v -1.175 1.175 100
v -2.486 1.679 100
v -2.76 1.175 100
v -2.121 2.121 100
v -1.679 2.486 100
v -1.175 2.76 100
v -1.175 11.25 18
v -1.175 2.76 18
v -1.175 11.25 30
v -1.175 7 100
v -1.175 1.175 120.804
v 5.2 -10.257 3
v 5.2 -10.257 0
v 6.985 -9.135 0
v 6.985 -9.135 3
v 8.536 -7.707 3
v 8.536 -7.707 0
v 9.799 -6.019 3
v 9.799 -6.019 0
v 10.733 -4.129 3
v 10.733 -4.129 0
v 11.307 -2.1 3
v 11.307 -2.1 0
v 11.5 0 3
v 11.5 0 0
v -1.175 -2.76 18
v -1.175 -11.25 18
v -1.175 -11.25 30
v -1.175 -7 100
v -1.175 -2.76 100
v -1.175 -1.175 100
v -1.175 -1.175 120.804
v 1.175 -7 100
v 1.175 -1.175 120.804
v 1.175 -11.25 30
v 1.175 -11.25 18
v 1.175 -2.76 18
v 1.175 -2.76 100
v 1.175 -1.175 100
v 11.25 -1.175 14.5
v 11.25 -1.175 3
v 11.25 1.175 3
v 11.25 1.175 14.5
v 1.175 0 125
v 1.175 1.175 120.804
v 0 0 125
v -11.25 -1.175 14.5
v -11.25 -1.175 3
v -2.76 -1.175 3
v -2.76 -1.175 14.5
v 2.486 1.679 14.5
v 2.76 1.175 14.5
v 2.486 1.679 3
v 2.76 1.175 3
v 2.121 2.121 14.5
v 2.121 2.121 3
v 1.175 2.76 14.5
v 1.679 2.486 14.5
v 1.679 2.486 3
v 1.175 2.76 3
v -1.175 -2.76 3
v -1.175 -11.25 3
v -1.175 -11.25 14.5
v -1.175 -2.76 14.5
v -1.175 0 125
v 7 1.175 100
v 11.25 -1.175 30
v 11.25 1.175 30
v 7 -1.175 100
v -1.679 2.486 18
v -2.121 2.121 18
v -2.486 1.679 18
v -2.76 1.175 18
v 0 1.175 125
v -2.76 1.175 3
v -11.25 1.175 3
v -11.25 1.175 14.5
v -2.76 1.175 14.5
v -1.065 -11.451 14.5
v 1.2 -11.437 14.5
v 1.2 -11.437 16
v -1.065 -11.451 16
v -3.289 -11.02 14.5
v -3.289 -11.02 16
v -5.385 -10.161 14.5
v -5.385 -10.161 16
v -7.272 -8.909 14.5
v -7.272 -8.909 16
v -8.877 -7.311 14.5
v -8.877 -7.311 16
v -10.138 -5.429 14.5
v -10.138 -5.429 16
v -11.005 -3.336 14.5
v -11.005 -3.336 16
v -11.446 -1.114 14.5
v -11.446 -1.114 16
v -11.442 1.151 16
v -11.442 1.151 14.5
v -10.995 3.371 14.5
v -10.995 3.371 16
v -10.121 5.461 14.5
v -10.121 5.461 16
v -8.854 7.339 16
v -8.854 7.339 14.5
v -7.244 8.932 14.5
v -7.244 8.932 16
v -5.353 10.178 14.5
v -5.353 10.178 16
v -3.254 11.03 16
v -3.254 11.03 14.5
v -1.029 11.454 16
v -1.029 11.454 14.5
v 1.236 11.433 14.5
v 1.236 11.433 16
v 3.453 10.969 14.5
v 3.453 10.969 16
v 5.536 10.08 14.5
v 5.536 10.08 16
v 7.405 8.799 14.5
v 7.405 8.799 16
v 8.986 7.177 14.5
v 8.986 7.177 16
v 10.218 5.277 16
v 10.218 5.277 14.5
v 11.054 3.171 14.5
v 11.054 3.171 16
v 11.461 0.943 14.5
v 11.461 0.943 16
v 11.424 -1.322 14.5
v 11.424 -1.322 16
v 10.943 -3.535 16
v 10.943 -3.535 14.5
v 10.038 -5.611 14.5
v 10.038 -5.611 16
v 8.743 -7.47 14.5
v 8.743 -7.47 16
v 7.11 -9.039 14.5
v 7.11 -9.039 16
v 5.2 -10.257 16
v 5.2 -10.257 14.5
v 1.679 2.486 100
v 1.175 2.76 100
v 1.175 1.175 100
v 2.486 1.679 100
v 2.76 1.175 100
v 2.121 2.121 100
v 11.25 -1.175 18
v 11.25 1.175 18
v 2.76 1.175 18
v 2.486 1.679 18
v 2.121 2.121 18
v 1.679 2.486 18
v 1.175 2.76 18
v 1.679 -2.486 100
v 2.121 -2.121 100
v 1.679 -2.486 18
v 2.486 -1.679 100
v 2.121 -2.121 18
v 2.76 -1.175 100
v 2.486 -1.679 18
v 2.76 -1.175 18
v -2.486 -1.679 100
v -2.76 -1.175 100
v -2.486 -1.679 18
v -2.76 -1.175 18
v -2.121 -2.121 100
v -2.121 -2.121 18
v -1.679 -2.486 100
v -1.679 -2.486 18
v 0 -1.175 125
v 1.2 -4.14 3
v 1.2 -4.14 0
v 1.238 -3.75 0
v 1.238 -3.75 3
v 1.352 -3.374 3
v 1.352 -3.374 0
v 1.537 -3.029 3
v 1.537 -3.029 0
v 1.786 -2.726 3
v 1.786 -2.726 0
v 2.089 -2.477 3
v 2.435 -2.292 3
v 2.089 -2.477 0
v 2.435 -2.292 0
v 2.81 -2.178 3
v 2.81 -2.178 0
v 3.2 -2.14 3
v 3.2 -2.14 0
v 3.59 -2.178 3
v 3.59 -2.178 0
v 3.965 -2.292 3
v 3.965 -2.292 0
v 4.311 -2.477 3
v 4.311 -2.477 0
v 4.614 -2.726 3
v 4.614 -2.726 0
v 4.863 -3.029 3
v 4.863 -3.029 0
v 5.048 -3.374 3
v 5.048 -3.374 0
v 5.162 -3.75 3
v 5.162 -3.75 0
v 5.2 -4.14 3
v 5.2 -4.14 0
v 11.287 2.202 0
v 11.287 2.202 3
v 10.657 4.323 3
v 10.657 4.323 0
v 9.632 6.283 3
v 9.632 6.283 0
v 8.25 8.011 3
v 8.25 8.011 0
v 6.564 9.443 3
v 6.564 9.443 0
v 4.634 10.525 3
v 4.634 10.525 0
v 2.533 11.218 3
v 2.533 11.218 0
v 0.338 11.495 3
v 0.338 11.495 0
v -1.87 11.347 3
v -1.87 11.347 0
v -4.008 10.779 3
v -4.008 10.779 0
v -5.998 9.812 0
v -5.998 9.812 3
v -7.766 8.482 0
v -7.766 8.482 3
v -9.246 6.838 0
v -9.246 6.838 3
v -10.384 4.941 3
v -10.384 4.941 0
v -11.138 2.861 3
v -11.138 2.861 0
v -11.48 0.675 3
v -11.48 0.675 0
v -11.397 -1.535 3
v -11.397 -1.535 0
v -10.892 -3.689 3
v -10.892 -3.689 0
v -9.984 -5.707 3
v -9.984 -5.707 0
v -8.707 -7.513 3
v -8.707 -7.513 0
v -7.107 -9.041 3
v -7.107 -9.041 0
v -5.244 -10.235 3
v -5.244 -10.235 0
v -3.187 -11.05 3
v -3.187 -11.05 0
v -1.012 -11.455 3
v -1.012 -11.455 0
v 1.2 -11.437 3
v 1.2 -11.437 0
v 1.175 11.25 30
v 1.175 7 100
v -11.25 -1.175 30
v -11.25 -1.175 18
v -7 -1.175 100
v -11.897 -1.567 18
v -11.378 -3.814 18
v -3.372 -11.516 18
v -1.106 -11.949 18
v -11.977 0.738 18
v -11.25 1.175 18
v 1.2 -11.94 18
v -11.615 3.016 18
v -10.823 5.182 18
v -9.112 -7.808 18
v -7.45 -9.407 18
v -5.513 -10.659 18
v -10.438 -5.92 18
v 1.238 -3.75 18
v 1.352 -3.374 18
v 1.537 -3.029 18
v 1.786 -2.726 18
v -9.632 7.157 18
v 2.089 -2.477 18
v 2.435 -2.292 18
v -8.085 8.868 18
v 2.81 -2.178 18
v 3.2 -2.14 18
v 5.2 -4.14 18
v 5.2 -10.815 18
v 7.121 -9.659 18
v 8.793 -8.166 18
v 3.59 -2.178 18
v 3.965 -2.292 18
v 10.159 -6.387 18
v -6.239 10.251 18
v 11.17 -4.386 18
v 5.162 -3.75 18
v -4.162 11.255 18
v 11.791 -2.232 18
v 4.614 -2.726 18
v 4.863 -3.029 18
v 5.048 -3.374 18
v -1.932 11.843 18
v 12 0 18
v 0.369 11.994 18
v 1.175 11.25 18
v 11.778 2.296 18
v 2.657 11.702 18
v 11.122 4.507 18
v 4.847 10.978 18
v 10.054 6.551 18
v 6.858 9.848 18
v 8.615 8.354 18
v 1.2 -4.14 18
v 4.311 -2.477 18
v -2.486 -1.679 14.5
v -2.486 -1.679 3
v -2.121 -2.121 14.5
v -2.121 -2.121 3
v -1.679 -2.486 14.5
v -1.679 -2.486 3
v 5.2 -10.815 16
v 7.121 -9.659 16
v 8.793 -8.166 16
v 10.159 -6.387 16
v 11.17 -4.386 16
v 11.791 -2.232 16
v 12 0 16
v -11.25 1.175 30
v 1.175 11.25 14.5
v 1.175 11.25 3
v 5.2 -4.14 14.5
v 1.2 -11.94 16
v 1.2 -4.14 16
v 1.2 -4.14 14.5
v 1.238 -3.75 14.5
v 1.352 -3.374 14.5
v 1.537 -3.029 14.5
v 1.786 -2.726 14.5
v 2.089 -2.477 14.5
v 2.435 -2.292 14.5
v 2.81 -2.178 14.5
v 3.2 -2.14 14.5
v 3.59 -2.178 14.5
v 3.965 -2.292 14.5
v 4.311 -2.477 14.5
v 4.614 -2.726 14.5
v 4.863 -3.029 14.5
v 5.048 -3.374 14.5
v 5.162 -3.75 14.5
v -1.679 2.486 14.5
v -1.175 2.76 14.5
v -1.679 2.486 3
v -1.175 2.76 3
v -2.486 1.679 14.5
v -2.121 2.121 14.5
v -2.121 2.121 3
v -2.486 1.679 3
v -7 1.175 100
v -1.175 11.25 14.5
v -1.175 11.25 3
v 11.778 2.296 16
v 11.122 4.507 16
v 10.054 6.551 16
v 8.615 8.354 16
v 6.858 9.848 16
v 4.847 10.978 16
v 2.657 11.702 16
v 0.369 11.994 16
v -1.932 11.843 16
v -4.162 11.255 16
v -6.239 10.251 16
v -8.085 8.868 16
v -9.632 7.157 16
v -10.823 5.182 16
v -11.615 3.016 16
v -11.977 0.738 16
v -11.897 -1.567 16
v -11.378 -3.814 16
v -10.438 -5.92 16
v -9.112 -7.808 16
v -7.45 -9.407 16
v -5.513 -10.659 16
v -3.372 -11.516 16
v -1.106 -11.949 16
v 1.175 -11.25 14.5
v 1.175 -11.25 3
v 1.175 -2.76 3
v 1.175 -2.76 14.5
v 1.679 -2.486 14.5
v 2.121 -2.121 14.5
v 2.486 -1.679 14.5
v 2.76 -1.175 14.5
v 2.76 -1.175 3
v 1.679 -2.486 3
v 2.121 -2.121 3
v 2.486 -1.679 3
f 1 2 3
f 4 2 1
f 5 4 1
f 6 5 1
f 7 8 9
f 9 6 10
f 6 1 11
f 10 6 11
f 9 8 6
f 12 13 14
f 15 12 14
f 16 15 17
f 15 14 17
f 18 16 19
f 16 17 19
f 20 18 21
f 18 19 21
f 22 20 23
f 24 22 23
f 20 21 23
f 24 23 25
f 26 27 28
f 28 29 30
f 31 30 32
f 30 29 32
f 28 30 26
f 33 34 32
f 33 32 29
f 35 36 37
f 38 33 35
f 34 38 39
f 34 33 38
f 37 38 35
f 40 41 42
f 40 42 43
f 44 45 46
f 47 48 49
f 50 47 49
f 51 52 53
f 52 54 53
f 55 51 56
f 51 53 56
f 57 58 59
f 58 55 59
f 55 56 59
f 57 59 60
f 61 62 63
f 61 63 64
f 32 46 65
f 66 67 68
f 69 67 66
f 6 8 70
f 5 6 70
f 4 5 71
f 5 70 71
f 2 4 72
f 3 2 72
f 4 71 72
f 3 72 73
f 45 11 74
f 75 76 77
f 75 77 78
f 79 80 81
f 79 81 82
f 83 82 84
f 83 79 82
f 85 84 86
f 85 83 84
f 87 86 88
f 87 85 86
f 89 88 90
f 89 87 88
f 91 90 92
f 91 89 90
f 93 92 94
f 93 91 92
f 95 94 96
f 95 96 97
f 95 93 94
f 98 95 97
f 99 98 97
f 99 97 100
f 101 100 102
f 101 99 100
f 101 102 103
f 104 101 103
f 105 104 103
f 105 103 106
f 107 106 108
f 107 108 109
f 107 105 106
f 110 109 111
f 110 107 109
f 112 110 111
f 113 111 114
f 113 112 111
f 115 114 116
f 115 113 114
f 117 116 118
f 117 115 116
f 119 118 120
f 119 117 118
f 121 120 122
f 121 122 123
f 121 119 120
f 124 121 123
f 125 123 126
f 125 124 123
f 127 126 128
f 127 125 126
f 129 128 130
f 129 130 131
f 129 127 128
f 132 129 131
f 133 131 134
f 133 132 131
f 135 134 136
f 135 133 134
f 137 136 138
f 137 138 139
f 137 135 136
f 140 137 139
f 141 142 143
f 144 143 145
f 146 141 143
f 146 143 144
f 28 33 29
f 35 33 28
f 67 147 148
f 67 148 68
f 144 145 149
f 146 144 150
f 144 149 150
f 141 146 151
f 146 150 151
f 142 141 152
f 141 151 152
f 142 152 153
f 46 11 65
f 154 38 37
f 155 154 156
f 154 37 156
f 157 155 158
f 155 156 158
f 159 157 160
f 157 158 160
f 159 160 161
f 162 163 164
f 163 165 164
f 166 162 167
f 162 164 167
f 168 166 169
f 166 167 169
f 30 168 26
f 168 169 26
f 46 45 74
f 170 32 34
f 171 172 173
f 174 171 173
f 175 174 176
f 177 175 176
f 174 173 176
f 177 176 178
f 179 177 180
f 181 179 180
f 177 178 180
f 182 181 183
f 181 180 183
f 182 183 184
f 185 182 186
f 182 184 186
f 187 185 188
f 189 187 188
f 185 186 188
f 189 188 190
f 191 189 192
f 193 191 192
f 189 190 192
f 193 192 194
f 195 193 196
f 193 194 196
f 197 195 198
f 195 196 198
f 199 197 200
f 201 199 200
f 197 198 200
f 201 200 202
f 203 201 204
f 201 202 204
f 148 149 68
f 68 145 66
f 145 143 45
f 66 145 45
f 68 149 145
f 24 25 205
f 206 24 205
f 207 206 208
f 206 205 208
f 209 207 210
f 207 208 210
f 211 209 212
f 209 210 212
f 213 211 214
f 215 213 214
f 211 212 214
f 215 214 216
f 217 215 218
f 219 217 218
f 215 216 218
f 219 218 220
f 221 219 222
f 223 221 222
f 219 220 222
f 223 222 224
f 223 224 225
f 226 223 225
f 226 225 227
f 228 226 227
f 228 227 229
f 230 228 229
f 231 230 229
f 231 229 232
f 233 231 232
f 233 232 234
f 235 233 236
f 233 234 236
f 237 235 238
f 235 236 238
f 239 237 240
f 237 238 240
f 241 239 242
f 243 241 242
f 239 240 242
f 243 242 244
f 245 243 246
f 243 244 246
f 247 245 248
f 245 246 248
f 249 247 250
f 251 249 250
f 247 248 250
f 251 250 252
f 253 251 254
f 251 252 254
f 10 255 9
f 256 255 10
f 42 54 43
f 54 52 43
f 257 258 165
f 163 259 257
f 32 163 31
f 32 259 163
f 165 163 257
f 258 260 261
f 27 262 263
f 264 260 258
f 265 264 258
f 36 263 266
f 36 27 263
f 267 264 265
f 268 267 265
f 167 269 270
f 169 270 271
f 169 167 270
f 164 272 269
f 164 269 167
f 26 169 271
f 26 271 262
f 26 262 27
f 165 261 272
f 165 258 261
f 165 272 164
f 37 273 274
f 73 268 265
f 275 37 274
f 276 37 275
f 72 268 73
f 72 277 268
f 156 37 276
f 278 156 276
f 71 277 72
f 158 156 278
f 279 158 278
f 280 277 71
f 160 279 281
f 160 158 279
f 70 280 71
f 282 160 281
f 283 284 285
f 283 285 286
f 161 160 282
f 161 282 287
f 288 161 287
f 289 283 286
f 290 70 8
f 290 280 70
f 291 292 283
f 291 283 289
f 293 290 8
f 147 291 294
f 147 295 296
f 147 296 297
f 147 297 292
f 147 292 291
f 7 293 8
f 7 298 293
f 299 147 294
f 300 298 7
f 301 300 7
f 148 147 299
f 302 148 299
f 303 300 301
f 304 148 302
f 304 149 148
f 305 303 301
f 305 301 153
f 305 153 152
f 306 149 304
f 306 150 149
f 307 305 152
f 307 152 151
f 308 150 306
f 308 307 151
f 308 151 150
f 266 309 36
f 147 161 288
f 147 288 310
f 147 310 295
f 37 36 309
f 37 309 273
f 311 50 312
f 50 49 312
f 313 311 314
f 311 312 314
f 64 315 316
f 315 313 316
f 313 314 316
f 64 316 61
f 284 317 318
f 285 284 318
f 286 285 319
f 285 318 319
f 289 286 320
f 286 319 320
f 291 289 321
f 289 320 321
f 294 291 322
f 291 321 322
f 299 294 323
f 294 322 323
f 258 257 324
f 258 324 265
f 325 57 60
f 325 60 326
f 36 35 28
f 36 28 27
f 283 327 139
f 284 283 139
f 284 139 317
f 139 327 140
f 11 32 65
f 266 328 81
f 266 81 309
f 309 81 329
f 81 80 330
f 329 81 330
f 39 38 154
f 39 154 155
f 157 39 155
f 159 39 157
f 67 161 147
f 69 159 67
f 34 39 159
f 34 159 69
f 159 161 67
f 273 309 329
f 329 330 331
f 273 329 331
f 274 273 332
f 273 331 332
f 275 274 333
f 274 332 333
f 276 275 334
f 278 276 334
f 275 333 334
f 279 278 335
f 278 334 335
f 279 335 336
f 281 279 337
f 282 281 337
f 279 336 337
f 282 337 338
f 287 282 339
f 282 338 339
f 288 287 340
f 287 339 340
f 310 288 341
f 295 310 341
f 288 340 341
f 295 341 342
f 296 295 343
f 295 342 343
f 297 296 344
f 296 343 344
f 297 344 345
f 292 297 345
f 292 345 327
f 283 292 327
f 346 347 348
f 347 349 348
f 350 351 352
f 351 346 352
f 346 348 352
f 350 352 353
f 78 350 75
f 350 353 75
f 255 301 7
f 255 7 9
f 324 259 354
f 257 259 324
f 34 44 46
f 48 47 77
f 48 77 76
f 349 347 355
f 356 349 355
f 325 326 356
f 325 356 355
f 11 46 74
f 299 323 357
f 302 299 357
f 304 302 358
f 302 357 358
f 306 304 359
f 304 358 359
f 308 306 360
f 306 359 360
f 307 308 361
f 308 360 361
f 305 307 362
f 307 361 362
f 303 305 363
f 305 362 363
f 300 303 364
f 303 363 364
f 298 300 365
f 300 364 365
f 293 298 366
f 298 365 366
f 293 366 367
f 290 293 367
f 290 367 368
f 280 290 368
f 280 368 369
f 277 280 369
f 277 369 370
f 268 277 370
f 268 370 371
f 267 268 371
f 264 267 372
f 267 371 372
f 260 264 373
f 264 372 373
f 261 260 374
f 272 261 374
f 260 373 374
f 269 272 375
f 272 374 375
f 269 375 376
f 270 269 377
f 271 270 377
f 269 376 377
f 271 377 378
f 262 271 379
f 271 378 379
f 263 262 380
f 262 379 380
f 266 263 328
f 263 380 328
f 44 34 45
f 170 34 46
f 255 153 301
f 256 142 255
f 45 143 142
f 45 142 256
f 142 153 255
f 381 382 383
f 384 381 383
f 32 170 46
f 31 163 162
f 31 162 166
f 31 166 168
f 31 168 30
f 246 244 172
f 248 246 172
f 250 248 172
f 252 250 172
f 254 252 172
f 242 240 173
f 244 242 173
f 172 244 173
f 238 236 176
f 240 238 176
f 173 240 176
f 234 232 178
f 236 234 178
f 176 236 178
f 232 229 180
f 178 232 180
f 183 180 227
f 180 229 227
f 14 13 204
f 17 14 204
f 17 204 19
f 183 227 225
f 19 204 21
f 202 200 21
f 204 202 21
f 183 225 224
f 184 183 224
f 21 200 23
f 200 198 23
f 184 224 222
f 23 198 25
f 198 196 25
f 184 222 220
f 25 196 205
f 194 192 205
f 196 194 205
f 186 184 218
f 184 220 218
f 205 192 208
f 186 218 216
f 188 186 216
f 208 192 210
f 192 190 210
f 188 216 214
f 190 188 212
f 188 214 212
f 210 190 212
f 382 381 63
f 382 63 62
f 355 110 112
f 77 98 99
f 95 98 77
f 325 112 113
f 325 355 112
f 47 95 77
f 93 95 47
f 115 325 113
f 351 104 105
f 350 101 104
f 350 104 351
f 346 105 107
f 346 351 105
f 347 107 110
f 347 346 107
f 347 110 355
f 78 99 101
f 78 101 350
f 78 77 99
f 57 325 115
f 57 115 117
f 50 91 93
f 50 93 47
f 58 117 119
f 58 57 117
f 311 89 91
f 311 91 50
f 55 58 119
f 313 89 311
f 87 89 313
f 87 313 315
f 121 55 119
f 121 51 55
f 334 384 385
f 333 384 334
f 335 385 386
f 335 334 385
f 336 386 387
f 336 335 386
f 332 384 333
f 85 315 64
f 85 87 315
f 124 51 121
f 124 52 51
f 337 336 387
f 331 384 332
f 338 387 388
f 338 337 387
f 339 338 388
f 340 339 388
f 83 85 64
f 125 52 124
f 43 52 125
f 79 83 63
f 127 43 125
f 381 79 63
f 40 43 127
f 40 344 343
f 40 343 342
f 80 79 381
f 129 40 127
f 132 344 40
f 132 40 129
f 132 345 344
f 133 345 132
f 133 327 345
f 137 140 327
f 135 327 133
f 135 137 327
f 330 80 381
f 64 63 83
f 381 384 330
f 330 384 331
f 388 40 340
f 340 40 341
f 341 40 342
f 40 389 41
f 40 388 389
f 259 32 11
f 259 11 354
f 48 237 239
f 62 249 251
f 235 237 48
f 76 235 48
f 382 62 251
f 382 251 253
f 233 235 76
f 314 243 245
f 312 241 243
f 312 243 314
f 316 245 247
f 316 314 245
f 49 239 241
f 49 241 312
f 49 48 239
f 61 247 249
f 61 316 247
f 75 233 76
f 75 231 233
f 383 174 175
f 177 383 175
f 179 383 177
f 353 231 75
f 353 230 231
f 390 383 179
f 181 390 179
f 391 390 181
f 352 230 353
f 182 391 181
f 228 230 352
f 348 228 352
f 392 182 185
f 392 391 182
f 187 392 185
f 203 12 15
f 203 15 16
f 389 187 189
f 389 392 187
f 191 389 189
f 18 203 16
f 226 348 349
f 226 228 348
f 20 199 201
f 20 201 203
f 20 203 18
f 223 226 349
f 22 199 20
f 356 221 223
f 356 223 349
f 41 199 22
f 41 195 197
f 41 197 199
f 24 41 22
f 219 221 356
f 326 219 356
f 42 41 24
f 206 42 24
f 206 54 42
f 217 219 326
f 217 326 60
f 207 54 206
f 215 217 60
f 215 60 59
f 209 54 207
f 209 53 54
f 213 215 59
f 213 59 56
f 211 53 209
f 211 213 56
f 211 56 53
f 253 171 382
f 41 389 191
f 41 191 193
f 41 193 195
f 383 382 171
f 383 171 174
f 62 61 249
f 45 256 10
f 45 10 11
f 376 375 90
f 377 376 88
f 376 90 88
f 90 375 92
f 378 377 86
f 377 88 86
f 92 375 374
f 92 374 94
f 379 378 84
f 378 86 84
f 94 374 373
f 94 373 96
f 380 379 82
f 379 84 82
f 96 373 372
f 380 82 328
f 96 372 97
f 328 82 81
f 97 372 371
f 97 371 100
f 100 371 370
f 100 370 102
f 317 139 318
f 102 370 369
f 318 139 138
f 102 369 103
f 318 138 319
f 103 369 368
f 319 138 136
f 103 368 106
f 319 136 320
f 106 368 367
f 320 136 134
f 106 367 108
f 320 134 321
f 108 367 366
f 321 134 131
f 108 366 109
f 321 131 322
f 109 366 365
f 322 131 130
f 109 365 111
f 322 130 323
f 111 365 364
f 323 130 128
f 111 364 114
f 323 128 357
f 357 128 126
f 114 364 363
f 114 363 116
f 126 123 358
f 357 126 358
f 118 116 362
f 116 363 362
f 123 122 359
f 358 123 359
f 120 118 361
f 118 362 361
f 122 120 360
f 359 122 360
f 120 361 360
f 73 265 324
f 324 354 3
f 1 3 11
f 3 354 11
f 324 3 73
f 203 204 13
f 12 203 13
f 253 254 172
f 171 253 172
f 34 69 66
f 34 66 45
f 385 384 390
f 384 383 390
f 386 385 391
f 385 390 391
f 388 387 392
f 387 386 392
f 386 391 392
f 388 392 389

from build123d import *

# Parameters (mm, degrees)
F0_R     = 3
F1_DEPTH = 3
F2_START = -14.5
F2_DEPTH = 1.5
F3_START = 16
F3_DEPTH = 2
F6_DEPTH = 18.001
F7_DEPTH = 1.175
F8_DEPTH = 1.175
F9_DEPTH = 100


with BuildPart() as f1:
    # F0 (on Top) → F1 (new body)
    with BuildSketch(Plane.XY):
        with BuildLine():
            ThreePointArc((5.2, -10.2571925984), (9.799234664, -6.0187207943), (11.5, 0))
            ThreePointArc((11.5, 0), (-8.5454666344, 7.6957780633), (1.2, -11.4372199419))
            Line((1.2, -11.4372199419), (1.2, -4.1398492453))
            ThreePointArc((1.2, -4.1398492453), (3.2, -2.1398492453), (5.2, -4.1398492453))
            Line((5.2, -4.1398492453), (5.2, -10.2571925984))
        make_face()
        Circle(F0_R, mode=Mode.SUBTRACT)
        Circle(F0_R)
    extrude(amount=F1_DEPTH)

    # F0 (on Top) → F6 (cut, through all)
    with BuildSketch(Plane.XY):
        with BuildLine():
            Line((1.2, -4.1398492453), (1.2, -11.4372199419))
            ThreePointArc((1.2, -11.4372199419), (3.253938557, -11.0300445995), (5.2, -10.2571925984))
            Line((5.2, -10.2571925984), (5.2, -4.1398492453))
            ThreePointArc((5.2, -4.1398492453), (3.2, -2.1398492453), (1.2, -4.1398492453))
        make_face()
        with BuildLine():
            ThreePointArc((5.2, -10.2571925984), (3.253938557, -11.0300445995), (1.2, -11.4372199419))
            Line((1.2, -11.4372199419), (1.2, -11.9398492453))
            ThreePointArc((1.2, -11.9398492453), (3.2490662236, -11.5517777279), (5.2, -10.8148046677))
            Line((5.2, -10.8148046677), (5.2, -10.2571925984))
        make_face()
    extrude(amount=F6_DEPTH, mode=Mode.SUBTRACT)



with BuildPart() as f2:
    # F1_face (on face) → F2 (new body)
    with BuildSketch(Plane(origin=(-0.2778637097, 0.5964787123, 0), x_dir=(1, 0, 0), z_dir=(0, 0, -1)).offset(F2_START)):
        with BuildLine():
            ThreePointArc((1.4778637097, 12.0336986542), (-2.9760748473, -10.4335658873), (5.4778637097, 10.8536713106))
            Line((5.4778637097, 10.8536713106), (5.4778637097, 4.7363279575))
            ThreePointArc((5.4778637097, 4.7363279575), (3.4778637097, 2.7363279575), (1.4778637097, 4.7363279575))
            Line((1.4778637097, 4.7363279575), (1.4778637097, 12.0336986542))
        make_face()
    extrude(amount=-F2_DEPTH)


with BuildPart() as f3:
    # F0 (on Top) → F3 (new body)
    with BuildSketch(Plane.XY.offset(F3_START)):
        with BuildLine():
            ThreePointArc((5.2, -10.2571925984), (9.799234664, -6.0187207943), (11.5, 0))
            ThreePointArc((11.5, 0), (-8.5454666344, 7.6957780633), (1.2, -11.4372199419))
            Line((1.2, -11.4372199419), (1.2, -4.1398492453))
            ThreePointArc((1.2, -4.1398492453), (3.2, -2.1398492453), (5.2, -4.1398492453))
            Line((5.2, -4.1398492453), (5.2, -10.2571925984))
        make_face()
        Circle(F0_R, mode=Mode.SUBTRACT)
        with BuildLine():
            ThreePointArc((1.2, -11.4372199419), (-8.5454666344, 7.6957780633), (11.5, 0))
            ThreePointArc((11.5, 0), (9.799234664, -6.0187207943), (5.2, -10.2571925984))
            Line((5.2, -10.2571925984), (5.2, -10.8148046677))
            ThreePointArc((5.2, -10.8148046677), (10.1587400794, -6.3874877691), (12, 0))
            ThreePointArc((12, 0), (-8.8994381845, 8.049844719), (1.2, -11.9398492453))
            Line((1.2, -11.9398492453), (1.2, -11.4372199419))
        make_face()
        Circle(F0_R)
    extrude(amount=F3_DEPTH)


with BuildPart() as f7:
    # F4 (on Front) → F7 (new body, symmetric)
    with BuildSketch(Plane.XZ):
        Polygon((-11.25, 30), (-11.25, 0), (0, 0), (11.25, 0), (11.25, 30), (7, 100), (0, 125), (-7, 100), align=None)
    extrude(amount=F7_DEPTH, both=True)


with BuildPart() as f8:
    # F5 (on Right) → F8 (new body, symmetric)
    with BuildSketch(Plane.YZ):
        Polygon((-11.25, 30), (-11.25, 0), (0, 0), (11.25, 0), (11.25, 30), (7, 100), (0, 125), (-7, 100), align=None)
    extrude(amount=F8_DEPTH, both=True)


with BuildPart() as f1_1:
    add(f1.part)

    add(f2.part)  # F9 merges F2

    add(f3.part)  # F9 merges F3

    add(f7.part)  # F9 merges F7

    add(f8.part)  # F9 merges F8
    # F0 (on Top) → F9 (join)
    with BuildSketch(Plane.XY):
        Circle(F0_R)
    extrude(amount=F9_DEPTH)


solid = f1_1.part
